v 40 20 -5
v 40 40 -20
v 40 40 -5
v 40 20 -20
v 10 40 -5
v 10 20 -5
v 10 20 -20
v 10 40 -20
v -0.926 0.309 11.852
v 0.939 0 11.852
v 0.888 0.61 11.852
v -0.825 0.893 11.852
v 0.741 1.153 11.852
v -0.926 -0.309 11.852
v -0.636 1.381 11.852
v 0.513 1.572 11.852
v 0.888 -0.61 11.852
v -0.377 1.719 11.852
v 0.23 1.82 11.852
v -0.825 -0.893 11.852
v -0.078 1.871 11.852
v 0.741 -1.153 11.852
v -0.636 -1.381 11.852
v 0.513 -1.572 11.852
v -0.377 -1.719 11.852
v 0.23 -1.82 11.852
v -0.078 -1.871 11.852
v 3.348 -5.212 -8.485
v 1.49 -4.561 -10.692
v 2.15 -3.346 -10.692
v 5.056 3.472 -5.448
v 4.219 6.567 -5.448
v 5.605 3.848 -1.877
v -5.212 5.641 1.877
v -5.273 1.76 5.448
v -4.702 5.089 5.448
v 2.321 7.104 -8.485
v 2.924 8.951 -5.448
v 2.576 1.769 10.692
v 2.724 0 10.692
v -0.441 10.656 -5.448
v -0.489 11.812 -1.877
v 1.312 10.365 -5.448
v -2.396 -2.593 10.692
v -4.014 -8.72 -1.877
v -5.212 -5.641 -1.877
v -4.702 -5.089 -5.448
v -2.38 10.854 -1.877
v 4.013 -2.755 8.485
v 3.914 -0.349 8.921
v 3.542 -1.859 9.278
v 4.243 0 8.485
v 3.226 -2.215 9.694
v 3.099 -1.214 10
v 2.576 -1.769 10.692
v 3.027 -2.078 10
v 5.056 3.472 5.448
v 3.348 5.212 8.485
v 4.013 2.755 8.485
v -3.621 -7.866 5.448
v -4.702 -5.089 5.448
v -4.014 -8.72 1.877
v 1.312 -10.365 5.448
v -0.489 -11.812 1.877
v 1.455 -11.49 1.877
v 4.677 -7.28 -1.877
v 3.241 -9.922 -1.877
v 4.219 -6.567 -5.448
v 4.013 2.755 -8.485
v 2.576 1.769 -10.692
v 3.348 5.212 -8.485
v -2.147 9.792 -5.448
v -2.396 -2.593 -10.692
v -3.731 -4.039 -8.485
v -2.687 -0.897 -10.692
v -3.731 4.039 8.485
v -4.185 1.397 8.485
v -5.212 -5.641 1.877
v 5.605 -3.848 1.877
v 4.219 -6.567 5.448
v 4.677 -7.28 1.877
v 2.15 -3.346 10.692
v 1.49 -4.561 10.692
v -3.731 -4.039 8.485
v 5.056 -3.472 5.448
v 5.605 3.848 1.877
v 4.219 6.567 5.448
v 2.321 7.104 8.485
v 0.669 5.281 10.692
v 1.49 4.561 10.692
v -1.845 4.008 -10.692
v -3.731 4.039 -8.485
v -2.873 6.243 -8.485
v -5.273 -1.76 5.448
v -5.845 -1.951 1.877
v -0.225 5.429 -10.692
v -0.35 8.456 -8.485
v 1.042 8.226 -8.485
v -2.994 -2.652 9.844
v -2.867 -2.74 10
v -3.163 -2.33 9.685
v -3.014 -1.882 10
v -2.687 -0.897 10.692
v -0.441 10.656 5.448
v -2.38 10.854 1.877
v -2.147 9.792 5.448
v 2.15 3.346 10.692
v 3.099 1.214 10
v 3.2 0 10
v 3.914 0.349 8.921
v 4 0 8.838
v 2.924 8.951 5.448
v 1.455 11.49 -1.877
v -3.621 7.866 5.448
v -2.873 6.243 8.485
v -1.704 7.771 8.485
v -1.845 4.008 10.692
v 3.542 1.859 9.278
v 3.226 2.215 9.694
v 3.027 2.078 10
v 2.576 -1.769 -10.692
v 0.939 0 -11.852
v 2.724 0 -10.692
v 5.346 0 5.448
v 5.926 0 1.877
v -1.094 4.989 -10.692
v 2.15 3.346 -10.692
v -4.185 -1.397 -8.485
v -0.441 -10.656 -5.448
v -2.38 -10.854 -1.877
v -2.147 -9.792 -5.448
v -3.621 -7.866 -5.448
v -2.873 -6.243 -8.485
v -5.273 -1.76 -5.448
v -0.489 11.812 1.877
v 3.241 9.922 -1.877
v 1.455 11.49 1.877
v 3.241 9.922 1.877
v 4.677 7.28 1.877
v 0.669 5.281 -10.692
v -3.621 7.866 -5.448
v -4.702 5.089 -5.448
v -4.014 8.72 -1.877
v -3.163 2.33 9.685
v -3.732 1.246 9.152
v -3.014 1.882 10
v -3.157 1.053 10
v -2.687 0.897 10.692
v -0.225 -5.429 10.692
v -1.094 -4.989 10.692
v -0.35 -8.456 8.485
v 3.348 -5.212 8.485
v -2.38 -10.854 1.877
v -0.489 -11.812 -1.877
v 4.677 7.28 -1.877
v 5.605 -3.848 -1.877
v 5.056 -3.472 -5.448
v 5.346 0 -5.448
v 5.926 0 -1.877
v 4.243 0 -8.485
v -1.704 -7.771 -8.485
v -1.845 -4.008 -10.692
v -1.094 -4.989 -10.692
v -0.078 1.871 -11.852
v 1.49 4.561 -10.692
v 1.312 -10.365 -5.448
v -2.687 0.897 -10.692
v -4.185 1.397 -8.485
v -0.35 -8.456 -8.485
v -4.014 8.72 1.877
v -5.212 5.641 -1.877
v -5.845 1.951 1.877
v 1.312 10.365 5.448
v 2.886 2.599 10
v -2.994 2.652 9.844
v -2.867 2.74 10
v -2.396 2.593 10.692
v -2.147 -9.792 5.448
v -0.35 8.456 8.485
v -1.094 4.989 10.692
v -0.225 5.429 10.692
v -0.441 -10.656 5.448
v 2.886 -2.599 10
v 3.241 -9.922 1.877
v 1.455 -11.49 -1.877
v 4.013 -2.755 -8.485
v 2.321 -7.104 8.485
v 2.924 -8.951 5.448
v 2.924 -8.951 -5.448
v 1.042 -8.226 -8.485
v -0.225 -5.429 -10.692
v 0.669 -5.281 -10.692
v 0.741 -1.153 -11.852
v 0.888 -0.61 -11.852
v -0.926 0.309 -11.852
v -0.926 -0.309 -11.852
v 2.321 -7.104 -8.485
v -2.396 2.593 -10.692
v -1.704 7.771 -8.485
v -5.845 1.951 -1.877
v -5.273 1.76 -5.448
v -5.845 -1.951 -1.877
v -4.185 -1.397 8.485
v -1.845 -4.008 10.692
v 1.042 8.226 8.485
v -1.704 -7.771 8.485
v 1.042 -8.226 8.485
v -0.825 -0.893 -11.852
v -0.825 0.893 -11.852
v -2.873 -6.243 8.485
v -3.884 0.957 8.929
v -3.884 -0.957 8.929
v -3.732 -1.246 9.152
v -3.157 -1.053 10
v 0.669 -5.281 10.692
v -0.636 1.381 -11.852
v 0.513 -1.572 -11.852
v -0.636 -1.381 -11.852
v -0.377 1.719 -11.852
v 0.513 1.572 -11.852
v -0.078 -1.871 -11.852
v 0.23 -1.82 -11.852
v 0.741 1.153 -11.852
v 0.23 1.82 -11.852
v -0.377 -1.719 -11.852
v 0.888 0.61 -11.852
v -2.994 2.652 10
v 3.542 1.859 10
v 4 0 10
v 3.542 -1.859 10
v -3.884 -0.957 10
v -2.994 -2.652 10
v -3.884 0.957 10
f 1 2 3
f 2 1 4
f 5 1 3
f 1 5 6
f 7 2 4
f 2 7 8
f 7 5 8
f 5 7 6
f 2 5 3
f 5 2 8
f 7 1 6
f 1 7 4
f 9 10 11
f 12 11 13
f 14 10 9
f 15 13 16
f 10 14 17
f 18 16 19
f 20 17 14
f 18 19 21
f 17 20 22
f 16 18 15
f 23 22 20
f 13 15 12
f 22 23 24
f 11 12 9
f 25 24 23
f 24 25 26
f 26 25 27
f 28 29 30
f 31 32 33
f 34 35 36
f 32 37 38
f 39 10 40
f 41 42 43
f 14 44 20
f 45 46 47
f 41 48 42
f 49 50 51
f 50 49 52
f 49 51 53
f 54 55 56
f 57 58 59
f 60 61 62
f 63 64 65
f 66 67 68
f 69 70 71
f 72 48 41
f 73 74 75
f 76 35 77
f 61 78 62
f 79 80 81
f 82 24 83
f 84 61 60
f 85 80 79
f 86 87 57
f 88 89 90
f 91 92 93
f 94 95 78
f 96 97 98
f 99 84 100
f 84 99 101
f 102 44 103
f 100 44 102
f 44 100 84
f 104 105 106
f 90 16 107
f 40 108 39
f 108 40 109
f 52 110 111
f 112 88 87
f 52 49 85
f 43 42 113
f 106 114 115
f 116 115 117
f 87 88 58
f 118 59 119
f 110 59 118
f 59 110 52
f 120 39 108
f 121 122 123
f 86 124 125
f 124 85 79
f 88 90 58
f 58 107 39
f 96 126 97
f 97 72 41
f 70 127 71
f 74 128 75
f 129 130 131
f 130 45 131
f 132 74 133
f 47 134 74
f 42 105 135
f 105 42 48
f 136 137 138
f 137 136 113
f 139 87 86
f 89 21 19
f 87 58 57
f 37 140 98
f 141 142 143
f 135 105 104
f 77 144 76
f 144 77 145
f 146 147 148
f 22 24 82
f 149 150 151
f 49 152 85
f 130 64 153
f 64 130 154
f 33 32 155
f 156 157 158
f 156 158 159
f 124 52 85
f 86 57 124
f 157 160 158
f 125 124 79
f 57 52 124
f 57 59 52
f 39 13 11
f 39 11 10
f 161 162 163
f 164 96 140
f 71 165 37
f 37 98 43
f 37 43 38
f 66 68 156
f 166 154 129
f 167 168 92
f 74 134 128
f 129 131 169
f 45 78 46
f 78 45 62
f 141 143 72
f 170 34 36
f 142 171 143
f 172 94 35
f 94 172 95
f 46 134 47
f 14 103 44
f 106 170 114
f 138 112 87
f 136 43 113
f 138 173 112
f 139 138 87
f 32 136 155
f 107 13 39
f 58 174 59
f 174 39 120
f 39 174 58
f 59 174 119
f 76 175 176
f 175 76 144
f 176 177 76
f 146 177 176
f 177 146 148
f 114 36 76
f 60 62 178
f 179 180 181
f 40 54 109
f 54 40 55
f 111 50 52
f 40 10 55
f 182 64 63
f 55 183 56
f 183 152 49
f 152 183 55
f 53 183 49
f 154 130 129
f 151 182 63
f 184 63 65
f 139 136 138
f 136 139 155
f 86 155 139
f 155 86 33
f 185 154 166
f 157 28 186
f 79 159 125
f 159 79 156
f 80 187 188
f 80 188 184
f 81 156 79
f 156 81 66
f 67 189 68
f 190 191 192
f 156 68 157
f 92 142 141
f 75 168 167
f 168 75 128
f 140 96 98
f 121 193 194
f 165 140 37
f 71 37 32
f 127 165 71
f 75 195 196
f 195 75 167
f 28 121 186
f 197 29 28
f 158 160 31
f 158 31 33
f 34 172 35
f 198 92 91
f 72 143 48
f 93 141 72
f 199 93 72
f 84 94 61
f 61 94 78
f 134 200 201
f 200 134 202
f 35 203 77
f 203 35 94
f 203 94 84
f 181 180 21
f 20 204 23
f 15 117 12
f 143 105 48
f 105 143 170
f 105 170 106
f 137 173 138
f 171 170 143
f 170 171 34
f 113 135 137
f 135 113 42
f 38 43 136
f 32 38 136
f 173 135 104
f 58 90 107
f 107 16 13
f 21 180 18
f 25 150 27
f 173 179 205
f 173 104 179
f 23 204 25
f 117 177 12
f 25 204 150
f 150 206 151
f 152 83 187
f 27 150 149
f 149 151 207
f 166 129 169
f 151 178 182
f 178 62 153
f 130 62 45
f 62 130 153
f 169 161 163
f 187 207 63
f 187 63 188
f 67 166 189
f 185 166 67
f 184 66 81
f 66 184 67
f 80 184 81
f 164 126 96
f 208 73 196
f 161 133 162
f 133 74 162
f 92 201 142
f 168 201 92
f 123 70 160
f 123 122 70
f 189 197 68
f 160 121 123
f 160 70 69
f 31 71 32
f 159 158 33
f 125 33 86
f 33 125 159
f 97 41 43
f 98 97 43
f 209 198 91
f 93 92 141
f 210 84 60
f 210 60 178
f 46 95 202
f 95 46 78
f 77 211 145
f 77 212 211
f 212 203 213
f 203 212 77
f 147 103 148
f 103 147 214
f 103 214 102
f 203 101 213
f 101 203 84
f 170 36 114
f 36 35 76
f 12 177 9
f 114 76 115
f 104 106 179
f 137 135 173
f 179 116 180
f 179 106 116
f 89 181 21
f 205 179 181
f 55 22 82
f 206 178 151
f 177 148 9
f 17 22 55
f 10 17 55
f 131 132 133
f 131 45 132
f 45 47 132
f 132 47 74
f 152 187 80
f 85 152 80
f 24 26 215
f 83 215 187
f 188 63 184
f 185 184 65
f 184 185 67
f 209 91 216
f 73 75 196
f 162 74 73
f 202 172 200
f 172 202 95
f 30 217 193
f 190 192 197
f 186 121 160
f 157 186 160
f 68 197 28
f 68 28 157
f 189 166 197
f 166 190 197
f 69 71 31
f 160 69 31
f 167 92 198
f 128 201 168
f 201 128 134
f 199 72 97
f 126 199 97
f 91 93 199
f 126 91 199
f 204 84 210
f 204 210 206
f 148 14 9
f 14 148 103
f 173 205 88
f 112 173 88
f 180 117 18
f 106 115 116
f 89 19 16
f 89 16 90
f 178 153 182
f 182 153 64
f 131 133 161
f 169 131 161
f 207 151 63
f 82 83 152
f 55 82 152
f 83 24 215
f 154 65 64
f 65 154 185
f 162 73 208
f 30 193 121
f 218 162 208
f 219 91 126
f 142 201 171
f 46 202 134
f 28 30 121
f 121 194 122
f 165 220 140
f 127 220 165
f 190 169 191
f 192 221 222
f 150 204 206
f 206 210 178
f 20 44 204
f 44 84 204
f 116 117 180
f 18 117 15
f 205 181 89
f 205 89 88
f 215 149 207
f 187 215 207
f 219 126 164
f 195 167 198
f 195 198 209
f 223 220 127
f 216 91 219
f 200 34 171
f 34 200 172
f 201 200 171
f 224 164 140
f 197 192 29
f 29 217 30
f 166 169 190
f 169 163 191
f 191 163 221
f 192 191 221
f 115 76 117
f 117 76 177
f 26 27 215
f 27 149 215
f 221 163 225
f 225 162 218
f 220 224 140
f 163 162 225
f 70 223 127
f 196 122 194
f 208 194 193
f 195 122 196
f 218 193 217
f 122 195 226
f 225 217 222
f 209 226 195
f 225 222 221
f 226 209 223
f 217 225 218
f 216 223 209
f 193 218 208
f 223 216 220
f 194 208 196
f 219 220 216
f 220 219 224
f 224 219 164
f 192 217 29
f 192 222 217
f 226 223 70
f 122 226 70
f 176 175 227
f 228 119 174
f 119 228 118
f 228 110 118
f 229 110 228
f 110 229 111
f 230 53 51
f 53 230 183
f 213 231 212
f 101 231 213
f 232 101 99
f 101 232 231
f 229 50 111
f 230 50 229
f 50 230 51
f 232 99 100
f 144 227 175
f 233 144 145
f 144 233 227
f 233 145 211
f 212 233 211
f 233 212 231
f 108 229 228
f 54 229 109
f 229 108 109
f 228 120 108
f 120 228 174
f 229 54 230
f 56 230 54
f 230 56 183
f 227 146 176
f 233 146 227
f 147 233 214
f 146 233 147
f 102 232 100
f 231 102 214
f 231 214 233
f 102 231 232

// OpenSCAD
// Generated by generate_scads.py
union() {
  translate([10,20,-20]) {
    cube(size=[30,20,15], center=false);
  }
  scale([1.0,2.0,2.0]) {
    sphere(r=6);
  }
  cylinder(h=10, r=4, center=false);
}
